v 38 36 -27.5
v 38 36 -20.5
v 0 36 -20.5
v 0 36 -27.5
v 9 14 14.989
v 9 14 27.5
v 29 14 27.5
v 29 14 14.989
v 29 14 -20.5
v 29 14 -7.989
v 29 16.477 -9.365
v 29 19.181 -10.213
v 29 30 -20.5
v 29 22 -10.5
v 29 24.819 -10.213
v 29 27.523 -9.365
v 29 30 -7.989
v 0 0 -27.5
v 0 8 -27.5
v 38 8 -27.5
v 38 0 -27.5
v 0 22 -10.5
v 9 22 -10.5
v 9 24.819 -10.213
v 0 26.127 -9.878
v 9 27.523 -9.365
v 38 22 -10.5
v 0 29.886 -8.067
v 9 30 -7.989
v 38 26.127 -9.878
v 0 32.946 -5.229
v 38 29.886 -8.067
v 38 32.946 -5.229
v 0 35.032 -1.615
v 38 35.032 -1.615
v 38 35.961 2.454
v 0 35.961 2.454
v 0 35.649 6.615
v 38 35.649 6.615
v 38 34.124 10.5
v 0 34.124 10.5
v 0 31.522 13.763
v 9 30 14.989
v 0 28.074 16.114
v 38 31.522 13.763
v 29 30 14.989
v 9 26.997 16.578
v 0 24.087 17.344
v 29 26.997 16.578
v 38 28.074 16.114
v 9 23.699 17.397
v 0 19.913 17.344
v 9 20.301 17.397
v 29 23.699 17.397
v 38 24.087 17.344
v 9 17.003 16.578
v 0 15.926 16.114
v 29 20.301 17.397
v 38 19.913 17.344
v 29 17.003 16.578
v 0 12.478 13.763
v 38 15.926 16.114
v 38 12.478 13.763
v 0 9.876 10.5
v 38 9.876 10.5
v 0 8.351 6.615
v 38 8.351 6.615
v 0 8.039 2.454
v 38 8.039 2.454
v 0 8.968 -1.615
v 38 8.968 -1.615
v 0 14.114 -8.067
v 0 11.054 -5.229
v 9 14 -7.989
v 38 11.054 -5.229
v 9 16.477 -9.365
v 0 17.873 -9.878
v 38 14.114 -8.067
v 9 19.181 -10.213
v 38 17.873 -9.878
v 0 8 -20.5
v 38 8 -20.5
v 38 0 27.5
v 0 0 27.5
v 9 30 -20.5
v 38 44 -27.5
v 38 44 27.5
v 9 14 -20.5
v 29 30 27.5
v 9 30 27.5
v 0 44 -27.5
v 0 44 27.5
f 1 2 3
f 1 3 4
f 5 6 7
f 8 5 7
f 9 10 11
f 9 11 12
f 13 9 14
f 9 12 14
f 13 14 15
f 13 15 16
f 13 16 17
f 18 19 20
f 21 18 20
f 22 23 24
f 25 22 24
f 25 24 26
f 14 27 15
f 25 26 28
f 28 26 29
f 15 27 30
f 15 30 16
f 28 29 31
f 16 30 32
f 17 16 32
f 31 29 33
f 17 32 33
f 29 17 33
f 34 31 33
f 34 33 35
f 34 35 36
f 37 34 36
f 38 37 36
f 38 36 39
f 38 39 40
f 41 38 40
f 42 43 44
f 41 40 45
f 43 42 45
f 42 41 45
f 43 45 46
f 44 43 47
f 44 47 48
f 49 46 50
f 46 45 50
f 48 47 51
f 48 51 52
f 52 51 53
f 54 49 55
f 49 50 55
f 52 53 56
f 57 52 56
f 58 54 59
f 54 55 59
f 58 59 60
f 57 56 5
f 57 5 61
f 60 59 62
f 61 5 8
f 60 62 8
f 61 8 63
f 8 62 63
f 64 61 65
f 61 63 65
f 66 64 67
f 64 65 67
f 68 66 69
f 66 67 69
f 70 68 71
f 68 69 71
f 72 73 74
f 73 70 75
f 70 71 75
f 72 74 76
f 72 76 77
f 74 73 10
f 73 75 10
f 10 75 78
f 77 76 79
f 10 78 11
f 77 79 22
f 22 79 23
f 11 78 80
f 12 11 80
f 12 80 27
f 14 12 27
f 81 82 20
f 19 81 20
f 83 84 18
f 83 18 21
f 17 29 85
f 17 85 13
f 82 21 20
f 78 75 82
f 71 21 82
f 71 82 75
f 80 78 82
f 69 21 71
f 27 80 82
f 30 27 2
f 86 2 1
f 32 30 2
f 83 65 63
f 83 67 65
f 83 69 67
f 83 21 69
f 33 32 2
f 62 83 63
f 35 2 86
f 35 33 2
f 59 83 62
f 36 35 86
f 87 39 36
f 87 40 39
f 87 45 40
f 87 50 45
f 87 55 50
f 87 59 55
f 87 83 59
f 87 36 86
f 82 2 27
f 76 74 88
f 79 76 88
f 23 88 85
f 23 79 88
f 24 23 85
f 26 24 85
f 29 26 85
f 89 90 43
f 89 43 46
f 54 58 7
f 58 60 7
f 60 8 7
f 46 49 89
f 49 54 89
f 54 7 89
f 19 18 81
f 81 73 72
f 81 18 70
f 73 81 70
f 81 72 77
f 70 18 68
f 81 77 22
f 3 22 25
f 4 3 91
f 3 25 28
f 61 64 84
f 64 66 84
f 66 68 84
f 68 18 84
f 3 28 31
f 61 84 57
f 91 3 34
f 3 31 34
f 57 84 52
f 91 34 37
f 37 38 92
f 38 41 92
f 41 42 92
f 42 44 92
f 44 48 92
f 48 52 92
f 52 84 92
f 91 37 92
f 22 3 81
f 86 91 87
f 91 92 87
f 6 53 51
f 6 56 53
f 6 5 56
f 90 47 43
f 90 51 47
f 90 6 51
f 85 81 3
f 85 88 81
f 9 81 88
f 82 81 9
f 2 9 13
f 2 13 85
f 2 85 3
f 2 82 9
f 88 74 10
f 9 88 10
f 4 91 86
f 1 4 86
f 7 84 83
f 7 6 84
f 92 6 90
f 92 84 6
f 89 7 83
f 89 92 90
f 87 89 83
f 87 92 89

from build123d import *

# Parameters (mm, degrees)
SKETCH1_W           = 38
SKETCH1_H           = 44
BOSS_EXTRUDE1_DEPTH = 27.5
SKETCH2_W           = 20
SKETCH2_H           = 16
CUT_EXTRUDE1_DEPTH  = 55
SKETCH3_R           = 14
CUT_EXTRUDE2_DEPTH  = 55
SKETCH4_W           = 7
SKETCH4_H           = 28
CUT_EXTRUDE3_DEPTH  = 65.313684391


with BuildPart() as part:
    # Sketch1 → Boss-Extrude1 (new, symmetric)
    with BuildSketch(Plane.XY):
        with Locations((19, 22)):
            Rectangle(SKETCH1_W, SKETCH1_H)
    extrude(amount=BOSS_EXTRUDE1_DEPTH, both=True)

    # Sketch2 → Cut-Extrude1 (cut)
    with BuildSketch(Plane.XY.offset(27.5)):
        with Locations((19, 22)):
            Rectangle(SKETCH2_W, SKETCH2_H)
    extrude(amount=-CUT_EXTRUDE1_DEPTH, mode=Mode.SUBTRACT)

    # Sketch3 → Cut-Extrude2 (cut)
    with BuildSketch(Plane(origin=(38, 0, 0), x_dir=(0, 0, -1), z_dir=(1, 0, 0))):
        with Locations((-3.5, 22)):
            Circle(SKETCH3_R)
    extrude(amount=-CUT_EXTRUDE2_DEPTH, mode=Mode.SUBTRACT)

    # Sketch4 → Cut-Extrude3 (cut, through all)
    with BuildSketch(Plane(origin=(38, 0, 0), x_dir=(0, 0, -1), z_dir=(1, 0, 0))):
        with Locations((24, 22)):
            Rectangle(SKETCH4_W, SKETCH4_H)
    extrude(amount=-CUT_EXTRUDE3_DEPTH, mode=Mode.SUBTRACT)


solid = part.part
